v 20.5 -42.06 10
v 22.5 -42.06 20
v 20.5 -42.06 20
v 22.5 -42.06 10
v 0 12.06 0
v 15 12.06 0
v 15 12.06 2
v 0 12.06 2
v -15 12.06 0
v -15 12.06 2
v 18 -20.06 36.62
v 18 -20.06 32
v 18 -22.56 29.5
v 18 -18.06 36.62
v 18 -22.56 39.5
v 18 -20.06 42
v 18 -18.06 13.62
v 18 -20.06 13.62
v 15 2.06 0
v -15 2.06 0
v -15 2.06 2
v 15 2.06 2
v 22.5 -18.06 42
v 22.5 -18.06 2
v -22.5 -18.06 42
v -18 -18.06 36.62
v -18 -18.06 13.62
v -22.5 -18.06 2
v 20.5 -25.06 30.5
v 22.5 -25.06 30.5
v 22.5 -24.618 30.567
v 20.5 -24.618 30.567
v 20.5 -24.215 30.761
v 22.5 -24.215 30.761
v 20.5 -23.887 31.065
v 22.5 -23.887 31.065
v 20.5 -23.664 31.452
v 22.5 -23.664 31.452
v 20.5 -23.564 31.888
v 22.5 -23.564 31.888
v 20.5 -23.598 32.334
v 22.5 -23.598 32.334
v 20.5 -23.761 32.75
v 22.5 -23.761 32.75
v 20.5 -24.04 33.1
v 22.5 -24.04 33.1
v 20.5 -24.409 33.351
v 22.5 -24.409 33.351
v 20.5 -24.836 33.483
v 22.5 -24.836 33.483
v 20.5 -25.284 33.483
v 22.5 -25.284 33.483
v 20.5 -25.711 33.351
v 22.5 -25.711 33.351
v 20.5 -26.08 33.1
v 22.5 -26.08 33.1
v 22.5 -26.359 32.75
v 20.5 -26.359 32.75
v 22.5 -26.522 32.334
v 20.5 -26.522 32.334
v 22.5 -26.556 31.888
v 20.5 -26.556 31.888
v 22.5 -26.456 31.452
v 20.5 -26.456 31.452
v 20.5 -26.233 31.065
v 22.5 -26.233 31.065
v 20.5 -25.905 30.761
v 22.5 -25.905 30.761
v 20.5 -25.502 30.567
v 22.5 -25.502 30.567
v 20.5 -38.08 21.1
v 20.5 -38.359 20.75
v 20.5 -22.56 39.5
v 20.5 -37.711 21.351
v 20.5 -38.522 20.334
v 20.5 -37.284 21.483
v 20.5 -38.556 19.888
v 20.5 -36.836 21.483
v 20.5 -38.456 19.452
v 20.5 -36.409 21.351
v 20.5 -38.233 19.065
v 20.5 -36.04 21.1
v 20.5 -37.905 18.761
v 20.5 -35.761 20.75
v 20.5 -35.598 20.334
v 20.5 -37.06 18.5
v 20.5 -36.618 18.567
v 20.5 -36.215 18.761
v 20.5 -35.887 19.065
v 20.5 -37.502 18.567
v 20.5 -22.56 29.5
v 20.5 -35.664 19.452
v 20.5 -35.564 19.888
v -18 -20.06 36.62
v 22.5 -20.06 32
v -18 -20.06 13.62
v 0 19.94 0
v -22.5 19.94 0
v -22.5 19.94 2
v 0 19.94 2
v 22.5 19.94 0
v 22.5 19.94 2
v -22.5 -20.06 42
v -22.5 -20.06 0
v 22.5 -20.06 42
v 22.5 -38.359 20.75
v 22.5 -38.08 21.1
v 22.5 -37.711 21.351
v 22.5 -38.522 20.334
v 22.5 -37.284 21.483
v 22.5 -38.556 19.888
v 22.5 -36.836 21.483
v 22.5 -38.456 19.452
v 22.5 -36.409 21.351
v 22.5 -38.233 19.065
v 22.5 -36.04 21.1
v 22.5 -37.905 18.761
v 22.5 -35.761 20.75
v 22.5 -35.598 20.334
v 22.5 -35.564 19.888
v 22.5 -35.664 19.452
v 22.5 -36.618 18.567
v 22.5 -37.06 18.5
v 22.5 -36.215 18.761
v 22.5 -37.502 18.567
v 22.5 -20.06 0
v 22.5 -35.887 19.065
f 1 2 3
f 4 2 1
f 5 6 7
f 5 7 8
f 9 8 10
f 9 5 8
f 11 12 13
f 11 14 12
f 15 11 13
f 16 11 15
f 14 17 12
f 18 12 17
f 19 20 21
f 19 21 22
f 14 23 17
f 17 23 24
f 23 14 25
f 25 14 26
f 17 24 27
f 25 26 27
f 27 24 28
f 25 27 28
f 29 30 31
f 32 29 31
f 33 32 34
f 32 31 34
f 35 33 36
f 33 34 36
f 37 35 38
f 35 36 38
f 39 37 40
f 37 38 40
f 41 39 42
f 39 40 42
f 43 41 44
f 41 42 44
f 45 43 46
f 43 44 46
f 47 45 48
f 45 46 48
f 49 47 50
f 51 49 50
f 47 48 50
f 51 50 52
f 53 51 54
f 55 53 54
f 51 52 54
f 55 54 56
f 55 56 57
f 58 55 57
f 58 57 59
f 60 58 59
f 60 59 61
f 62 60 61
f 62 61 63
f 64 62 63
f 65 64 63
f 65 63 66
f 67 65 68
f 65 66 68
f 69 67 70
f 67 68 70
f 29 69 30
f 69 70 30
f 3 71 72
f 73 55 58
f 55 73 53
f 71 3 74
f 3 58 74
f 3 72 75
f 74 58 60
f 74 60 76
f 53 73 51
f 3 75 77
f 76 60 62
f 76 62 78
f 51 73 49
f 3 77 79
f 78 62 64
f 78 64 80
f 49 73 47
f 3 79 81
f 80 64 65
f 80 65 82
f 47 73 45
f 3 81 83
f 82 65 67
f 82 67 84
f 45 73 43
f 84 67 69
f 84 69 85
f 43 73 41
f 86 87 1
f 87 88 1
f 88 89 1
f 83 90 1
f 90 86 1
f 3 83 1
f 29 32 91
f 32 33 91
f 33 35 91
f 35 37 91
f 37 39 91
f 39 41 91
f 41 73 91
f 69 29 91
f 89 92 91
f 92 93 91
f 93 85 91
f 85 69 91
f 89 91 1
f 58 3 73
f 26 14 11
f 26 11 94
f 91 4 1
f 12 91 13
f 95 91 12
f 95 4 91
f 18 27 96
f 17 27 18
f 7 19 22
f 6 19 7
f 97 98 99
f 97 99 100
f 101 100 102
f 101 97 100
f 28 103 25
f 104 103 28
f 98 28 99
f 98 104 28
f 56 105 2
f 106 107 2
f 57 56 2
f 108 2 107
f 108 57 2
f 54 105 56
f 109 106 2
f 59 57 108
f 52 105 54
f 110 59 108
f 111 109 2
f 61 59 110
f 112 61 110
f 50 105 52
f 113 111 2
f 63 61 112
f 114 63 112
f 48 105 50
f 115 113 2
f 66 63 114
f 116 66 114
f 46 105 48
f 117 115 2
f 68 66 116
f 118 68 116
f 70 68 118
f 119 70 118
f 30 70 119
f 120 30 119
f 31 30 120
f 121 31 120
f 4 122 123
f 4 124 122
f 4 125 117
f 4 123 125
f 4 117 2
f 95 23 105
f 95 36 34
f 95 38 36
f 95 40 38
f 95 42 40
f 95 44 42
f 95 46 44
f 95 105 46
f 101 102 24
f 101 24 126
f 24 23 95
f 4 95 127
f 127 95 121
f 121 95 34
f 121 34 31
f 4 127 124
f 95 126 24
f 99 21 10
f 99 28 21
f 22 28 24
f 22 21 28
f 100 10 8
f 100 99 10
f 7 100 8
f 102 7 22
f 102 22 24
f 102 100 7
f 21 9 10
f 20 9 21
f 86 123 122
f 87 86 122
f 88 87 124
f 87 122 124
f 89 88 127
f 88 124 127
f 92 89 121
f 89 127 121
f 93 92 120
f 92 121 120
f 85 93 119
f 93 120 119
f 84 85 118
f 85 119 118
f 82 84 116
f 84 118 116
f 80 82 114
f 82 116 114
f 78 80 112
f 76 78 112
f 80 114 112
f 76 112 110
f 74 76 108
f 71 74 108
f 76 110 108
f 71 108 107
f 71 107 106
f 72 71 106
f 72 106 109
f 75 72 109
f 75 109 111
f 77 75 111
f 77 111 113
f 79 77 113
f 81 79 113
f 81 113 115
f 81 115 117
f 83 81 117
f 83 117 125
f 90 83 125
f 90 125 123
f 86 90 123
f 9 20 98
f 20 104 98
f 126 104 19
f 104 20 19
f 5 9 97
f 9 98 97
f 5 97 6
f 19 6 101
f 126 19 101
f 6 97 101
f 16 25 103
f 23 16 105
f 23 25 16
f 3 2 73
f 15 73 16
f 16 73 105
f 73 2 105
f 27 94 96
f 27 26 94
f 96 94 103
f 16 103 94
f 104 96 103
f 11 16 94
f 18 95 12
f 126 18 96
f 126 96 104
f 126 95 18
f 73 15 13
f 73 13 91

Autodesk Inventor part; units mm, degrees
ref_plane "YZ Plane" through (0, 0, 0) normal (1, 0, 0) x (0, 1, 0)
ref_plane "XZ Plane" through (0, 0, 0) normal (0, 1, 0) x (-1, 0, 0)
ref_plane "XY Plane" through (0, 0, 0) normal (0, 0, 1) x (1, 0, 0)
sketch "Boceto1" plane through (0, 0, 0) normal (0, 0, 1) x (1, 0, 0)
  line L0 (-22.5, 19.94) -> (22.5, 19.94)
  line L1 (22.5, 19.94) -> (22.5, -20.06)
  line L2 (22.5, -20.06) -> (-22.5, -20.06)
  line L3 (-22.5, -20.06) -> (-22.5, 19.94)
  line L4 (0, 19.94) -> (0, 11.94)
  line L5 (15, 12.06) -> (-15, 12.06)
  line L6 (-15, 12.06) -> (-15, 2.06)
  line L7 (-15, 2.06) -> (15, 2.06)
  line L8 (15, 2.06) -> (15, 12.06)
  point P0 (0, 0)
  dimension "d0" = 45
  dimension "d1" = 40
  dimension "d2" = 8
  dimension "d4" = 30
  dimension "d5" = 10
extrude "Extrusión1" add sketch "Boceto1" along normal blind 2
sketch "Boceto2" plane through (0, 0, 2) normal (0, 0, 1) x (1, 0, 0)
  line L0 (-22.5, 19.94) -> (-22.5, -20.06) projected
  line L1 (-22.5, -20.06) -> (22.5, -20.06)
  line L2 (22.5, -20.06) -> (22.5, -18.06)
  line L3 (22.5, -18.06) -> (-22.5, -18.06)
  line L4 (-22.5, -18.06) -> (-22.5, -20.06)
  point P0 (0, 0)
  dimension "d8" = 45
  dimension "d9" = 2
extrude "Extrusión2" add sketch "Boceto2" along normal blind 40
sketch "Boceto3" plane through (-22.5, -18.06, 2) normal (0, 1, 0) x (1, 0, 0)
  line L0 (22.5, -34.62) -> (4.5, -34.62)
  line L1 (4.5, -34.62) -> (4.5, -11.62)
  line L2 (4.5, -11.62) -> (40.5, -11.62)
  line L3 (40.5, -11.62) -> (40.5, -34.62)
  line L4 (40.5, -34.62) -> (22.5, -34.62)
  point P0 (22.5, 2)
  dimension "d15" = 23
  dimension "d16" = 36
extrude "Extrusión3" cut sketch "Boceto3" against normal blind 2
sketch "Boceto4" plane through (22.5, -20.06, 0) normal (1, 0, 0) x (0, 0, -1)
  line L0 (-20, -22) -> (-42, 0)
  line L1 (-20, -22) -> (-10, -22)
  line L2 (-10, -22) -> (-32, 0)
  line L3 (-42, 0) -> (-32, 0)
  point P0 (0, 20.06)
  dimension "d38" = 10
extrude "Extrusión4" add sketch "Boceto4" against normal blind 2
sketch "Boceto6" plane through (22.5, 19.94, 2) normal (1, 0, 0) x (0, 0, -1)
  line L0 (-40, -40) -> (-40, -45)
  circle A0 centre (-30, -45) radius 1.5
  circle A1 centre (-18, -57) radius 1.5
  point P0 (2, -19.94)
  dimension "d31" = 5
extrude "Extrusión6" cut sketch "Boceto6" against normal blind 2
sketch "Boceto7" plane through (0, 0, 42) normal (0, 0, 1) x (1, 0, 0)
  line L0 (-22.5, -20.06) -> (20.5, -20.06) projected
  line L1 (20.5, -20.06) -> (18, -20.06)
  line L2 (18, -20.06) -> (18, -22.56)
  line L3 (18, -22.56) -> (20.5, -22.56)
  line L4 (20.5, -20.06) -> (20.5, -42.06) projected
  line L5 (20.5, -20.06) -> (20.5, -22.56)
  point P0 (0, 0)
  dimension "d39" = 2.5
  dimension "d40" = 2.5
extrude "Extrusión7" add sketch "Boceto7" against normal blind 12.5
sketch "Boceto9" plane through (20.5, -22.56, 42) normal (1, 0, 0) x (0, 0, -1)
  line L0 (22, -19.5) -> (2.5, 0) projected
  line L1 (0, 2.5) -> (0, 0) projected
  line L2 (2.5, 0) -> (0, 0)
  line L3 (0, 0) -> (0, 2.5)
  line L4 (0, 2.5) -> (2.5, 0)
  line L5 (0, 2.5) -> (22, -19.5) projected
  point P0 (42, 22.56)
extrude "Extrusión8" cut sketch "Boceto9" against normal blind 12
sketch "Boceto10" plane through (20.5, -22.56, 29.5) normal (1, 0, 0) x (0, 0, -1)
  line L0 (-2.5, 2.5) -> (0, 2.5) projected
  line L1 (0, 0) -> (0, 2.5)
  line L2 (-2.5, 2.5) -> (0, 0) projected
  line L3 (0, 2.5) -> (-2.5, 2.5)
  line L4 (-2.5, 2.5) -> (0, 0)
  point P0 (29.5, 22.56)
extrude "Extrusión9" cut sketch "Boceto10" against normal blind 12
properties part number "_3DPrint"
